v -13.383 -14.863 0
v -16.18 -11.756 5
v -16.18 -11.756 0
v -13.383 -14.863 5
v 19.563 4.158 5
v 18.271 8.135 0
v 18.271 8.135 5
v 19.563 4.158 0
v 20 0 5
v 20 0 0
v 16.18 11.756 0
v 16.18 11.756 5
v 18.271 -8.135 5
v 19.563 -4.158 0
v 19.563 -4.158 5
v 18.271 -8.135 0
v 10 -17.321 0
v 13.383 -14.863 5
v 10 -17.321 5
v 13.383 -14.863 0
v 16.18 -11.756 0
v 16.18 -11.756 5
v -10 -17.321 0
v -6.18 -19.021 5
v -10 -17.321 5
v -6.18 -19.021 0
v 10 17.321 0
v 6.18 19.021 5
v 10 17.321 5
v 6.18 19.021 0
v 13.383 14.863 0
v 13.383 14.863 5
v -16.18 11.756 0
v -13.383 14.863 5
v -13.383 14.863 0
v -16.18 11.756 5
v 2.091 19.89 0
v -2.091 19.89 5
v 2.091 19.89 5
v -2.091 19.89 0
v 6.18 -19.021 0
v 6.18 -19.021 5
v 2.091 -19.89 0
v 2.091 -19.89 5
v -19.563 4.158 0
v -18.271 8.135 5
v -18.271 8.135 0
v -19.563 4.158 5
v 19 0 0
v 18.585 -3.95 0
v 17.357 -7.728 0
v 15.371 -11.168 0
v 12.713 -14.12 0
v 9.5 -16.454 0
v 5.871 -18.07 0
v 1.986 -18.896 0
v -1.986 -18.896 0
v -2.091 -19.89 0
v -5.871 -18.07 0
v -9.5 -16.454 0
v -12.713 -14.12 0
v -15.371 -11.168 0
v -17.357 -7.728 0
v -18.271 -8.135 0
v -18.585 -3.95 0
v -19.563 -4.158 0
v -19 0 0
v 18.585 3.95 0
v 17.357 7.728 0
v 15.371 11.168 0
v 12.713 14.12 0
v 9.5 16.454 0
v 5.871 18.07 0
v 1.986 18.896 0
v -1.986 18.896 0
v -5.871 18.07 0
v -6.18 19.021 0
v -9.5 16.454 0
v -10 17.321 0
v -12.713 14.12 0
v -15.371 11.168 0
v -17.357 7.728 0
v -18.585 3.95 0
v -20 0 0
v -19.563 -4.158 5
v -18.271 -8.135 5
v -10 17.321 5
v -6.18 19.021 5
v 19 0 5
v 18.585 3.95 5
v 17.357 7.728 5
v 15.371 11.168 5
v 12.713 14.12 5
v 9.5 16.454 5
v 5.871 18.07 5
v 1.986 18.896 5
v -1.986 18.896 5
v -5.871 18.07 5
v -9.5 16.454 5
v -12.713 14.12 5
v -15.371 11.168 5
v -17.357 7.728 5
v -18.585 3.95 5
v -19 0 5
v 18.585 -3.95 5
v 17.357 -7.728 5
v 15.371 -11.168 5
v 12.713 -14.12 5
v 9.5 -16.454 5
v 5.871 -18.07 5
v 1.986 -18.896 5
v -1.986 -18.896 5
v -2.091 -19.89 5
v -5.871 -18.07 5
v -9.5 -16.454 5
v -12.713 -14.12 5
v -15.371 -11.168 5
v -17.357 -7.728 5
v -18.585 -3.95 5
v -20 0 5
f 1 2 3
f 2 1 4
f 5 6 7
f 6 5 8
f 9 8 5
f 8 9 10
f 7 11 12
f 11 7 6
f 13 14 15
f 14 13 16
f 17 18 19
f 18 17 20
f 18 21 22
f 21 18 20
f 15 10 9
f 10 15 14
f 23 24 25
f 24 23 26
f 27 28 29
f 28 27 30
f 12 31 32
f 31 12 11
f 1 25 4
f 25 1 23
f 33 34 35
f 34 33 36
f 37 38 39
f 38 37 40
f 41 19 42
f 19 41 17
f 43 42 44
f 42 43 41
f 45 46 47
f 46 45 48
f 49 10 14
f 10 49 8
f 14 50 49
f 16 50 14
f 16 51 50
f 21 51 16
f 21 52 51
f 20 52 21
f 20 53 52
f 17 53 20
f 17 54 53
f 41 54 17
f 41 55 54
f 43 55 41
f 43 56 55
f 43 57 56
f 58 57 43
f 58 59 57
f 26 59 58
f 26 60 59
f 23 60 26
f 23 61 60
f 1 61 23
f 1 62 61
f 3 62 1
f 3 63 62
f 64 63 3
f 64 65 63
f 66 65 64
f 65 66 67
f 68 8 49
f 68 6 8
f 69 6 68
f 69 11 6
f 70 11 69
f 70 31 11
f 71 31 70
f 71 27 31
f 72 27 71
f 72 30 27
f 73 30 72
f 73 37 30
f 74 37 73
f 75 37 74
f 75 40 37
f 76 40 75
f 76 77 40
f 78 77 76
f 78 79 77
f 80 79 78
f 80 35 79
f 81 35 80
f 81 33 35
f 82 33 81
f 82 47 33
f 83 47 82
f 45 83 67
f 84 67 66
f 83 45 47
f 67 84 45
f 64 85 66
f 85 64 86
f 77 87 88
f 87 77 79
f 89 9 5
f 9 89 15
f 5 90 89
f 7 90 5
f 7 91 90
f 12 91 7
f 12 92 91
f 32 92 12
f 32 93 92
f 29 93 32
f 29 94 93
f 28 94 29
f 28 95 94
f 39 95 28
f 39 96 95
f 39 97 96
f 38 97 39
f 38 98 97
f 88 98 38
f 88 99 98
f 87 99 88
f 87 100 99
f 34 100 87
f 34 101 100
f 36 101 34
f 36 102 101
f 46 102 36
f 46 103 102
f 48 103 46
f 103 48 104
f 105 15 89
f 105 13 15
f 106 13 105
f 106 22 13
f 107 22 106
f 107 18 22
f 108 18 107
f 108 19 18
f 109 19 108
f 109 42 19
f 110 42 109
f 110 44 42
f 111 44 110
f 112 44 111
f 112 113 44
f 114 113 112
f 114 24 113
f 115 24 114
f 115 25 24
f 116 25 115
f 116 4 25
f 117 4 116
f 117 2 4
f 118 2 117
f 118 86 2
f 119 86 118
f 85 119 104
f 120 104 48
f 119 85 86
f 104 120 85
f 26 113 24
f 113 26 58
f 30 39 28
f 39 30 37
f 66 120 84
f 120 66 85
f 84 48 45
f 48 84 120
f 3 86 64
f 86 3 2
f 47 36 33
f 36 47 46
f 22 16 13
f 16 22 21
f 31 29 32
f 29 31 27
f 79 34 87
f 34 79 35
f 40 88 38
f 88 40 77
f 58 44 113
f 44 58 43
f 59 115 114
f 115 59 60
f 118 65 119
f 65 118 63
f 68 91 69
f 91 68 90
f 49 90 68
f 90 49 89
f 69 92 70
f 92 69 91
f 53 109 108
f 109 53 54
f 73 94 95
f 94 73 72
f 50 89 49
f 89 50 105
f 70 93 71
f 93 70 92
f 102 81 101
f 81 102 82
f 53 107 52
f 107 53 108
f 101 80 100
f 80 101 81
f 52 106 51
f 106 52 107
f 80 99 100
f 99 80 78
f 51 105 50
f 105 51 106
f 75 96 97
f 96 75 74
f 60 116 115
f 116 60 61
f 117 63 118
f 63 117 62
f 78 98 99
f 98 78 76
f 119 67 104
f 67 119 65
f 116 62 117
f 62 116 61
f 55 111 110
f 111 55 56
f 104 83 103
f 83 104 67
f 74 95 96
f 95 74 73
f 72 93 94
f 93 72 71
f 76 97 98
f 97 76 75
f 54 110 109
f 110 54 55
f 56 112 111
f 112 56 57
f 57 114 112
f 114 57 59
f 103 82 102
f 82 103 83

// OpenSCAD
module tube(height, outer_diam = undef, inner_diam = undef, thickness) {
    if (outer_diam == undef && inner_diam == undef) {
        echo("ERROR: Pipe diameter not specified");
    }
    else {
        outer = outer_diam == undef ? inner_diam + thickness*2 : outer_diam;
        inner = inner_diam == undef ? outer_diam - thickness*2 : inner_diam;

        difference() {
            cylinder(h = height, d = outer);
            translate([0, 0, -0.1])
            cylinder(h = height+0.2, d = inner);
        }
    }
}

tube(5, outer_diam = 40, thickness = 1);
